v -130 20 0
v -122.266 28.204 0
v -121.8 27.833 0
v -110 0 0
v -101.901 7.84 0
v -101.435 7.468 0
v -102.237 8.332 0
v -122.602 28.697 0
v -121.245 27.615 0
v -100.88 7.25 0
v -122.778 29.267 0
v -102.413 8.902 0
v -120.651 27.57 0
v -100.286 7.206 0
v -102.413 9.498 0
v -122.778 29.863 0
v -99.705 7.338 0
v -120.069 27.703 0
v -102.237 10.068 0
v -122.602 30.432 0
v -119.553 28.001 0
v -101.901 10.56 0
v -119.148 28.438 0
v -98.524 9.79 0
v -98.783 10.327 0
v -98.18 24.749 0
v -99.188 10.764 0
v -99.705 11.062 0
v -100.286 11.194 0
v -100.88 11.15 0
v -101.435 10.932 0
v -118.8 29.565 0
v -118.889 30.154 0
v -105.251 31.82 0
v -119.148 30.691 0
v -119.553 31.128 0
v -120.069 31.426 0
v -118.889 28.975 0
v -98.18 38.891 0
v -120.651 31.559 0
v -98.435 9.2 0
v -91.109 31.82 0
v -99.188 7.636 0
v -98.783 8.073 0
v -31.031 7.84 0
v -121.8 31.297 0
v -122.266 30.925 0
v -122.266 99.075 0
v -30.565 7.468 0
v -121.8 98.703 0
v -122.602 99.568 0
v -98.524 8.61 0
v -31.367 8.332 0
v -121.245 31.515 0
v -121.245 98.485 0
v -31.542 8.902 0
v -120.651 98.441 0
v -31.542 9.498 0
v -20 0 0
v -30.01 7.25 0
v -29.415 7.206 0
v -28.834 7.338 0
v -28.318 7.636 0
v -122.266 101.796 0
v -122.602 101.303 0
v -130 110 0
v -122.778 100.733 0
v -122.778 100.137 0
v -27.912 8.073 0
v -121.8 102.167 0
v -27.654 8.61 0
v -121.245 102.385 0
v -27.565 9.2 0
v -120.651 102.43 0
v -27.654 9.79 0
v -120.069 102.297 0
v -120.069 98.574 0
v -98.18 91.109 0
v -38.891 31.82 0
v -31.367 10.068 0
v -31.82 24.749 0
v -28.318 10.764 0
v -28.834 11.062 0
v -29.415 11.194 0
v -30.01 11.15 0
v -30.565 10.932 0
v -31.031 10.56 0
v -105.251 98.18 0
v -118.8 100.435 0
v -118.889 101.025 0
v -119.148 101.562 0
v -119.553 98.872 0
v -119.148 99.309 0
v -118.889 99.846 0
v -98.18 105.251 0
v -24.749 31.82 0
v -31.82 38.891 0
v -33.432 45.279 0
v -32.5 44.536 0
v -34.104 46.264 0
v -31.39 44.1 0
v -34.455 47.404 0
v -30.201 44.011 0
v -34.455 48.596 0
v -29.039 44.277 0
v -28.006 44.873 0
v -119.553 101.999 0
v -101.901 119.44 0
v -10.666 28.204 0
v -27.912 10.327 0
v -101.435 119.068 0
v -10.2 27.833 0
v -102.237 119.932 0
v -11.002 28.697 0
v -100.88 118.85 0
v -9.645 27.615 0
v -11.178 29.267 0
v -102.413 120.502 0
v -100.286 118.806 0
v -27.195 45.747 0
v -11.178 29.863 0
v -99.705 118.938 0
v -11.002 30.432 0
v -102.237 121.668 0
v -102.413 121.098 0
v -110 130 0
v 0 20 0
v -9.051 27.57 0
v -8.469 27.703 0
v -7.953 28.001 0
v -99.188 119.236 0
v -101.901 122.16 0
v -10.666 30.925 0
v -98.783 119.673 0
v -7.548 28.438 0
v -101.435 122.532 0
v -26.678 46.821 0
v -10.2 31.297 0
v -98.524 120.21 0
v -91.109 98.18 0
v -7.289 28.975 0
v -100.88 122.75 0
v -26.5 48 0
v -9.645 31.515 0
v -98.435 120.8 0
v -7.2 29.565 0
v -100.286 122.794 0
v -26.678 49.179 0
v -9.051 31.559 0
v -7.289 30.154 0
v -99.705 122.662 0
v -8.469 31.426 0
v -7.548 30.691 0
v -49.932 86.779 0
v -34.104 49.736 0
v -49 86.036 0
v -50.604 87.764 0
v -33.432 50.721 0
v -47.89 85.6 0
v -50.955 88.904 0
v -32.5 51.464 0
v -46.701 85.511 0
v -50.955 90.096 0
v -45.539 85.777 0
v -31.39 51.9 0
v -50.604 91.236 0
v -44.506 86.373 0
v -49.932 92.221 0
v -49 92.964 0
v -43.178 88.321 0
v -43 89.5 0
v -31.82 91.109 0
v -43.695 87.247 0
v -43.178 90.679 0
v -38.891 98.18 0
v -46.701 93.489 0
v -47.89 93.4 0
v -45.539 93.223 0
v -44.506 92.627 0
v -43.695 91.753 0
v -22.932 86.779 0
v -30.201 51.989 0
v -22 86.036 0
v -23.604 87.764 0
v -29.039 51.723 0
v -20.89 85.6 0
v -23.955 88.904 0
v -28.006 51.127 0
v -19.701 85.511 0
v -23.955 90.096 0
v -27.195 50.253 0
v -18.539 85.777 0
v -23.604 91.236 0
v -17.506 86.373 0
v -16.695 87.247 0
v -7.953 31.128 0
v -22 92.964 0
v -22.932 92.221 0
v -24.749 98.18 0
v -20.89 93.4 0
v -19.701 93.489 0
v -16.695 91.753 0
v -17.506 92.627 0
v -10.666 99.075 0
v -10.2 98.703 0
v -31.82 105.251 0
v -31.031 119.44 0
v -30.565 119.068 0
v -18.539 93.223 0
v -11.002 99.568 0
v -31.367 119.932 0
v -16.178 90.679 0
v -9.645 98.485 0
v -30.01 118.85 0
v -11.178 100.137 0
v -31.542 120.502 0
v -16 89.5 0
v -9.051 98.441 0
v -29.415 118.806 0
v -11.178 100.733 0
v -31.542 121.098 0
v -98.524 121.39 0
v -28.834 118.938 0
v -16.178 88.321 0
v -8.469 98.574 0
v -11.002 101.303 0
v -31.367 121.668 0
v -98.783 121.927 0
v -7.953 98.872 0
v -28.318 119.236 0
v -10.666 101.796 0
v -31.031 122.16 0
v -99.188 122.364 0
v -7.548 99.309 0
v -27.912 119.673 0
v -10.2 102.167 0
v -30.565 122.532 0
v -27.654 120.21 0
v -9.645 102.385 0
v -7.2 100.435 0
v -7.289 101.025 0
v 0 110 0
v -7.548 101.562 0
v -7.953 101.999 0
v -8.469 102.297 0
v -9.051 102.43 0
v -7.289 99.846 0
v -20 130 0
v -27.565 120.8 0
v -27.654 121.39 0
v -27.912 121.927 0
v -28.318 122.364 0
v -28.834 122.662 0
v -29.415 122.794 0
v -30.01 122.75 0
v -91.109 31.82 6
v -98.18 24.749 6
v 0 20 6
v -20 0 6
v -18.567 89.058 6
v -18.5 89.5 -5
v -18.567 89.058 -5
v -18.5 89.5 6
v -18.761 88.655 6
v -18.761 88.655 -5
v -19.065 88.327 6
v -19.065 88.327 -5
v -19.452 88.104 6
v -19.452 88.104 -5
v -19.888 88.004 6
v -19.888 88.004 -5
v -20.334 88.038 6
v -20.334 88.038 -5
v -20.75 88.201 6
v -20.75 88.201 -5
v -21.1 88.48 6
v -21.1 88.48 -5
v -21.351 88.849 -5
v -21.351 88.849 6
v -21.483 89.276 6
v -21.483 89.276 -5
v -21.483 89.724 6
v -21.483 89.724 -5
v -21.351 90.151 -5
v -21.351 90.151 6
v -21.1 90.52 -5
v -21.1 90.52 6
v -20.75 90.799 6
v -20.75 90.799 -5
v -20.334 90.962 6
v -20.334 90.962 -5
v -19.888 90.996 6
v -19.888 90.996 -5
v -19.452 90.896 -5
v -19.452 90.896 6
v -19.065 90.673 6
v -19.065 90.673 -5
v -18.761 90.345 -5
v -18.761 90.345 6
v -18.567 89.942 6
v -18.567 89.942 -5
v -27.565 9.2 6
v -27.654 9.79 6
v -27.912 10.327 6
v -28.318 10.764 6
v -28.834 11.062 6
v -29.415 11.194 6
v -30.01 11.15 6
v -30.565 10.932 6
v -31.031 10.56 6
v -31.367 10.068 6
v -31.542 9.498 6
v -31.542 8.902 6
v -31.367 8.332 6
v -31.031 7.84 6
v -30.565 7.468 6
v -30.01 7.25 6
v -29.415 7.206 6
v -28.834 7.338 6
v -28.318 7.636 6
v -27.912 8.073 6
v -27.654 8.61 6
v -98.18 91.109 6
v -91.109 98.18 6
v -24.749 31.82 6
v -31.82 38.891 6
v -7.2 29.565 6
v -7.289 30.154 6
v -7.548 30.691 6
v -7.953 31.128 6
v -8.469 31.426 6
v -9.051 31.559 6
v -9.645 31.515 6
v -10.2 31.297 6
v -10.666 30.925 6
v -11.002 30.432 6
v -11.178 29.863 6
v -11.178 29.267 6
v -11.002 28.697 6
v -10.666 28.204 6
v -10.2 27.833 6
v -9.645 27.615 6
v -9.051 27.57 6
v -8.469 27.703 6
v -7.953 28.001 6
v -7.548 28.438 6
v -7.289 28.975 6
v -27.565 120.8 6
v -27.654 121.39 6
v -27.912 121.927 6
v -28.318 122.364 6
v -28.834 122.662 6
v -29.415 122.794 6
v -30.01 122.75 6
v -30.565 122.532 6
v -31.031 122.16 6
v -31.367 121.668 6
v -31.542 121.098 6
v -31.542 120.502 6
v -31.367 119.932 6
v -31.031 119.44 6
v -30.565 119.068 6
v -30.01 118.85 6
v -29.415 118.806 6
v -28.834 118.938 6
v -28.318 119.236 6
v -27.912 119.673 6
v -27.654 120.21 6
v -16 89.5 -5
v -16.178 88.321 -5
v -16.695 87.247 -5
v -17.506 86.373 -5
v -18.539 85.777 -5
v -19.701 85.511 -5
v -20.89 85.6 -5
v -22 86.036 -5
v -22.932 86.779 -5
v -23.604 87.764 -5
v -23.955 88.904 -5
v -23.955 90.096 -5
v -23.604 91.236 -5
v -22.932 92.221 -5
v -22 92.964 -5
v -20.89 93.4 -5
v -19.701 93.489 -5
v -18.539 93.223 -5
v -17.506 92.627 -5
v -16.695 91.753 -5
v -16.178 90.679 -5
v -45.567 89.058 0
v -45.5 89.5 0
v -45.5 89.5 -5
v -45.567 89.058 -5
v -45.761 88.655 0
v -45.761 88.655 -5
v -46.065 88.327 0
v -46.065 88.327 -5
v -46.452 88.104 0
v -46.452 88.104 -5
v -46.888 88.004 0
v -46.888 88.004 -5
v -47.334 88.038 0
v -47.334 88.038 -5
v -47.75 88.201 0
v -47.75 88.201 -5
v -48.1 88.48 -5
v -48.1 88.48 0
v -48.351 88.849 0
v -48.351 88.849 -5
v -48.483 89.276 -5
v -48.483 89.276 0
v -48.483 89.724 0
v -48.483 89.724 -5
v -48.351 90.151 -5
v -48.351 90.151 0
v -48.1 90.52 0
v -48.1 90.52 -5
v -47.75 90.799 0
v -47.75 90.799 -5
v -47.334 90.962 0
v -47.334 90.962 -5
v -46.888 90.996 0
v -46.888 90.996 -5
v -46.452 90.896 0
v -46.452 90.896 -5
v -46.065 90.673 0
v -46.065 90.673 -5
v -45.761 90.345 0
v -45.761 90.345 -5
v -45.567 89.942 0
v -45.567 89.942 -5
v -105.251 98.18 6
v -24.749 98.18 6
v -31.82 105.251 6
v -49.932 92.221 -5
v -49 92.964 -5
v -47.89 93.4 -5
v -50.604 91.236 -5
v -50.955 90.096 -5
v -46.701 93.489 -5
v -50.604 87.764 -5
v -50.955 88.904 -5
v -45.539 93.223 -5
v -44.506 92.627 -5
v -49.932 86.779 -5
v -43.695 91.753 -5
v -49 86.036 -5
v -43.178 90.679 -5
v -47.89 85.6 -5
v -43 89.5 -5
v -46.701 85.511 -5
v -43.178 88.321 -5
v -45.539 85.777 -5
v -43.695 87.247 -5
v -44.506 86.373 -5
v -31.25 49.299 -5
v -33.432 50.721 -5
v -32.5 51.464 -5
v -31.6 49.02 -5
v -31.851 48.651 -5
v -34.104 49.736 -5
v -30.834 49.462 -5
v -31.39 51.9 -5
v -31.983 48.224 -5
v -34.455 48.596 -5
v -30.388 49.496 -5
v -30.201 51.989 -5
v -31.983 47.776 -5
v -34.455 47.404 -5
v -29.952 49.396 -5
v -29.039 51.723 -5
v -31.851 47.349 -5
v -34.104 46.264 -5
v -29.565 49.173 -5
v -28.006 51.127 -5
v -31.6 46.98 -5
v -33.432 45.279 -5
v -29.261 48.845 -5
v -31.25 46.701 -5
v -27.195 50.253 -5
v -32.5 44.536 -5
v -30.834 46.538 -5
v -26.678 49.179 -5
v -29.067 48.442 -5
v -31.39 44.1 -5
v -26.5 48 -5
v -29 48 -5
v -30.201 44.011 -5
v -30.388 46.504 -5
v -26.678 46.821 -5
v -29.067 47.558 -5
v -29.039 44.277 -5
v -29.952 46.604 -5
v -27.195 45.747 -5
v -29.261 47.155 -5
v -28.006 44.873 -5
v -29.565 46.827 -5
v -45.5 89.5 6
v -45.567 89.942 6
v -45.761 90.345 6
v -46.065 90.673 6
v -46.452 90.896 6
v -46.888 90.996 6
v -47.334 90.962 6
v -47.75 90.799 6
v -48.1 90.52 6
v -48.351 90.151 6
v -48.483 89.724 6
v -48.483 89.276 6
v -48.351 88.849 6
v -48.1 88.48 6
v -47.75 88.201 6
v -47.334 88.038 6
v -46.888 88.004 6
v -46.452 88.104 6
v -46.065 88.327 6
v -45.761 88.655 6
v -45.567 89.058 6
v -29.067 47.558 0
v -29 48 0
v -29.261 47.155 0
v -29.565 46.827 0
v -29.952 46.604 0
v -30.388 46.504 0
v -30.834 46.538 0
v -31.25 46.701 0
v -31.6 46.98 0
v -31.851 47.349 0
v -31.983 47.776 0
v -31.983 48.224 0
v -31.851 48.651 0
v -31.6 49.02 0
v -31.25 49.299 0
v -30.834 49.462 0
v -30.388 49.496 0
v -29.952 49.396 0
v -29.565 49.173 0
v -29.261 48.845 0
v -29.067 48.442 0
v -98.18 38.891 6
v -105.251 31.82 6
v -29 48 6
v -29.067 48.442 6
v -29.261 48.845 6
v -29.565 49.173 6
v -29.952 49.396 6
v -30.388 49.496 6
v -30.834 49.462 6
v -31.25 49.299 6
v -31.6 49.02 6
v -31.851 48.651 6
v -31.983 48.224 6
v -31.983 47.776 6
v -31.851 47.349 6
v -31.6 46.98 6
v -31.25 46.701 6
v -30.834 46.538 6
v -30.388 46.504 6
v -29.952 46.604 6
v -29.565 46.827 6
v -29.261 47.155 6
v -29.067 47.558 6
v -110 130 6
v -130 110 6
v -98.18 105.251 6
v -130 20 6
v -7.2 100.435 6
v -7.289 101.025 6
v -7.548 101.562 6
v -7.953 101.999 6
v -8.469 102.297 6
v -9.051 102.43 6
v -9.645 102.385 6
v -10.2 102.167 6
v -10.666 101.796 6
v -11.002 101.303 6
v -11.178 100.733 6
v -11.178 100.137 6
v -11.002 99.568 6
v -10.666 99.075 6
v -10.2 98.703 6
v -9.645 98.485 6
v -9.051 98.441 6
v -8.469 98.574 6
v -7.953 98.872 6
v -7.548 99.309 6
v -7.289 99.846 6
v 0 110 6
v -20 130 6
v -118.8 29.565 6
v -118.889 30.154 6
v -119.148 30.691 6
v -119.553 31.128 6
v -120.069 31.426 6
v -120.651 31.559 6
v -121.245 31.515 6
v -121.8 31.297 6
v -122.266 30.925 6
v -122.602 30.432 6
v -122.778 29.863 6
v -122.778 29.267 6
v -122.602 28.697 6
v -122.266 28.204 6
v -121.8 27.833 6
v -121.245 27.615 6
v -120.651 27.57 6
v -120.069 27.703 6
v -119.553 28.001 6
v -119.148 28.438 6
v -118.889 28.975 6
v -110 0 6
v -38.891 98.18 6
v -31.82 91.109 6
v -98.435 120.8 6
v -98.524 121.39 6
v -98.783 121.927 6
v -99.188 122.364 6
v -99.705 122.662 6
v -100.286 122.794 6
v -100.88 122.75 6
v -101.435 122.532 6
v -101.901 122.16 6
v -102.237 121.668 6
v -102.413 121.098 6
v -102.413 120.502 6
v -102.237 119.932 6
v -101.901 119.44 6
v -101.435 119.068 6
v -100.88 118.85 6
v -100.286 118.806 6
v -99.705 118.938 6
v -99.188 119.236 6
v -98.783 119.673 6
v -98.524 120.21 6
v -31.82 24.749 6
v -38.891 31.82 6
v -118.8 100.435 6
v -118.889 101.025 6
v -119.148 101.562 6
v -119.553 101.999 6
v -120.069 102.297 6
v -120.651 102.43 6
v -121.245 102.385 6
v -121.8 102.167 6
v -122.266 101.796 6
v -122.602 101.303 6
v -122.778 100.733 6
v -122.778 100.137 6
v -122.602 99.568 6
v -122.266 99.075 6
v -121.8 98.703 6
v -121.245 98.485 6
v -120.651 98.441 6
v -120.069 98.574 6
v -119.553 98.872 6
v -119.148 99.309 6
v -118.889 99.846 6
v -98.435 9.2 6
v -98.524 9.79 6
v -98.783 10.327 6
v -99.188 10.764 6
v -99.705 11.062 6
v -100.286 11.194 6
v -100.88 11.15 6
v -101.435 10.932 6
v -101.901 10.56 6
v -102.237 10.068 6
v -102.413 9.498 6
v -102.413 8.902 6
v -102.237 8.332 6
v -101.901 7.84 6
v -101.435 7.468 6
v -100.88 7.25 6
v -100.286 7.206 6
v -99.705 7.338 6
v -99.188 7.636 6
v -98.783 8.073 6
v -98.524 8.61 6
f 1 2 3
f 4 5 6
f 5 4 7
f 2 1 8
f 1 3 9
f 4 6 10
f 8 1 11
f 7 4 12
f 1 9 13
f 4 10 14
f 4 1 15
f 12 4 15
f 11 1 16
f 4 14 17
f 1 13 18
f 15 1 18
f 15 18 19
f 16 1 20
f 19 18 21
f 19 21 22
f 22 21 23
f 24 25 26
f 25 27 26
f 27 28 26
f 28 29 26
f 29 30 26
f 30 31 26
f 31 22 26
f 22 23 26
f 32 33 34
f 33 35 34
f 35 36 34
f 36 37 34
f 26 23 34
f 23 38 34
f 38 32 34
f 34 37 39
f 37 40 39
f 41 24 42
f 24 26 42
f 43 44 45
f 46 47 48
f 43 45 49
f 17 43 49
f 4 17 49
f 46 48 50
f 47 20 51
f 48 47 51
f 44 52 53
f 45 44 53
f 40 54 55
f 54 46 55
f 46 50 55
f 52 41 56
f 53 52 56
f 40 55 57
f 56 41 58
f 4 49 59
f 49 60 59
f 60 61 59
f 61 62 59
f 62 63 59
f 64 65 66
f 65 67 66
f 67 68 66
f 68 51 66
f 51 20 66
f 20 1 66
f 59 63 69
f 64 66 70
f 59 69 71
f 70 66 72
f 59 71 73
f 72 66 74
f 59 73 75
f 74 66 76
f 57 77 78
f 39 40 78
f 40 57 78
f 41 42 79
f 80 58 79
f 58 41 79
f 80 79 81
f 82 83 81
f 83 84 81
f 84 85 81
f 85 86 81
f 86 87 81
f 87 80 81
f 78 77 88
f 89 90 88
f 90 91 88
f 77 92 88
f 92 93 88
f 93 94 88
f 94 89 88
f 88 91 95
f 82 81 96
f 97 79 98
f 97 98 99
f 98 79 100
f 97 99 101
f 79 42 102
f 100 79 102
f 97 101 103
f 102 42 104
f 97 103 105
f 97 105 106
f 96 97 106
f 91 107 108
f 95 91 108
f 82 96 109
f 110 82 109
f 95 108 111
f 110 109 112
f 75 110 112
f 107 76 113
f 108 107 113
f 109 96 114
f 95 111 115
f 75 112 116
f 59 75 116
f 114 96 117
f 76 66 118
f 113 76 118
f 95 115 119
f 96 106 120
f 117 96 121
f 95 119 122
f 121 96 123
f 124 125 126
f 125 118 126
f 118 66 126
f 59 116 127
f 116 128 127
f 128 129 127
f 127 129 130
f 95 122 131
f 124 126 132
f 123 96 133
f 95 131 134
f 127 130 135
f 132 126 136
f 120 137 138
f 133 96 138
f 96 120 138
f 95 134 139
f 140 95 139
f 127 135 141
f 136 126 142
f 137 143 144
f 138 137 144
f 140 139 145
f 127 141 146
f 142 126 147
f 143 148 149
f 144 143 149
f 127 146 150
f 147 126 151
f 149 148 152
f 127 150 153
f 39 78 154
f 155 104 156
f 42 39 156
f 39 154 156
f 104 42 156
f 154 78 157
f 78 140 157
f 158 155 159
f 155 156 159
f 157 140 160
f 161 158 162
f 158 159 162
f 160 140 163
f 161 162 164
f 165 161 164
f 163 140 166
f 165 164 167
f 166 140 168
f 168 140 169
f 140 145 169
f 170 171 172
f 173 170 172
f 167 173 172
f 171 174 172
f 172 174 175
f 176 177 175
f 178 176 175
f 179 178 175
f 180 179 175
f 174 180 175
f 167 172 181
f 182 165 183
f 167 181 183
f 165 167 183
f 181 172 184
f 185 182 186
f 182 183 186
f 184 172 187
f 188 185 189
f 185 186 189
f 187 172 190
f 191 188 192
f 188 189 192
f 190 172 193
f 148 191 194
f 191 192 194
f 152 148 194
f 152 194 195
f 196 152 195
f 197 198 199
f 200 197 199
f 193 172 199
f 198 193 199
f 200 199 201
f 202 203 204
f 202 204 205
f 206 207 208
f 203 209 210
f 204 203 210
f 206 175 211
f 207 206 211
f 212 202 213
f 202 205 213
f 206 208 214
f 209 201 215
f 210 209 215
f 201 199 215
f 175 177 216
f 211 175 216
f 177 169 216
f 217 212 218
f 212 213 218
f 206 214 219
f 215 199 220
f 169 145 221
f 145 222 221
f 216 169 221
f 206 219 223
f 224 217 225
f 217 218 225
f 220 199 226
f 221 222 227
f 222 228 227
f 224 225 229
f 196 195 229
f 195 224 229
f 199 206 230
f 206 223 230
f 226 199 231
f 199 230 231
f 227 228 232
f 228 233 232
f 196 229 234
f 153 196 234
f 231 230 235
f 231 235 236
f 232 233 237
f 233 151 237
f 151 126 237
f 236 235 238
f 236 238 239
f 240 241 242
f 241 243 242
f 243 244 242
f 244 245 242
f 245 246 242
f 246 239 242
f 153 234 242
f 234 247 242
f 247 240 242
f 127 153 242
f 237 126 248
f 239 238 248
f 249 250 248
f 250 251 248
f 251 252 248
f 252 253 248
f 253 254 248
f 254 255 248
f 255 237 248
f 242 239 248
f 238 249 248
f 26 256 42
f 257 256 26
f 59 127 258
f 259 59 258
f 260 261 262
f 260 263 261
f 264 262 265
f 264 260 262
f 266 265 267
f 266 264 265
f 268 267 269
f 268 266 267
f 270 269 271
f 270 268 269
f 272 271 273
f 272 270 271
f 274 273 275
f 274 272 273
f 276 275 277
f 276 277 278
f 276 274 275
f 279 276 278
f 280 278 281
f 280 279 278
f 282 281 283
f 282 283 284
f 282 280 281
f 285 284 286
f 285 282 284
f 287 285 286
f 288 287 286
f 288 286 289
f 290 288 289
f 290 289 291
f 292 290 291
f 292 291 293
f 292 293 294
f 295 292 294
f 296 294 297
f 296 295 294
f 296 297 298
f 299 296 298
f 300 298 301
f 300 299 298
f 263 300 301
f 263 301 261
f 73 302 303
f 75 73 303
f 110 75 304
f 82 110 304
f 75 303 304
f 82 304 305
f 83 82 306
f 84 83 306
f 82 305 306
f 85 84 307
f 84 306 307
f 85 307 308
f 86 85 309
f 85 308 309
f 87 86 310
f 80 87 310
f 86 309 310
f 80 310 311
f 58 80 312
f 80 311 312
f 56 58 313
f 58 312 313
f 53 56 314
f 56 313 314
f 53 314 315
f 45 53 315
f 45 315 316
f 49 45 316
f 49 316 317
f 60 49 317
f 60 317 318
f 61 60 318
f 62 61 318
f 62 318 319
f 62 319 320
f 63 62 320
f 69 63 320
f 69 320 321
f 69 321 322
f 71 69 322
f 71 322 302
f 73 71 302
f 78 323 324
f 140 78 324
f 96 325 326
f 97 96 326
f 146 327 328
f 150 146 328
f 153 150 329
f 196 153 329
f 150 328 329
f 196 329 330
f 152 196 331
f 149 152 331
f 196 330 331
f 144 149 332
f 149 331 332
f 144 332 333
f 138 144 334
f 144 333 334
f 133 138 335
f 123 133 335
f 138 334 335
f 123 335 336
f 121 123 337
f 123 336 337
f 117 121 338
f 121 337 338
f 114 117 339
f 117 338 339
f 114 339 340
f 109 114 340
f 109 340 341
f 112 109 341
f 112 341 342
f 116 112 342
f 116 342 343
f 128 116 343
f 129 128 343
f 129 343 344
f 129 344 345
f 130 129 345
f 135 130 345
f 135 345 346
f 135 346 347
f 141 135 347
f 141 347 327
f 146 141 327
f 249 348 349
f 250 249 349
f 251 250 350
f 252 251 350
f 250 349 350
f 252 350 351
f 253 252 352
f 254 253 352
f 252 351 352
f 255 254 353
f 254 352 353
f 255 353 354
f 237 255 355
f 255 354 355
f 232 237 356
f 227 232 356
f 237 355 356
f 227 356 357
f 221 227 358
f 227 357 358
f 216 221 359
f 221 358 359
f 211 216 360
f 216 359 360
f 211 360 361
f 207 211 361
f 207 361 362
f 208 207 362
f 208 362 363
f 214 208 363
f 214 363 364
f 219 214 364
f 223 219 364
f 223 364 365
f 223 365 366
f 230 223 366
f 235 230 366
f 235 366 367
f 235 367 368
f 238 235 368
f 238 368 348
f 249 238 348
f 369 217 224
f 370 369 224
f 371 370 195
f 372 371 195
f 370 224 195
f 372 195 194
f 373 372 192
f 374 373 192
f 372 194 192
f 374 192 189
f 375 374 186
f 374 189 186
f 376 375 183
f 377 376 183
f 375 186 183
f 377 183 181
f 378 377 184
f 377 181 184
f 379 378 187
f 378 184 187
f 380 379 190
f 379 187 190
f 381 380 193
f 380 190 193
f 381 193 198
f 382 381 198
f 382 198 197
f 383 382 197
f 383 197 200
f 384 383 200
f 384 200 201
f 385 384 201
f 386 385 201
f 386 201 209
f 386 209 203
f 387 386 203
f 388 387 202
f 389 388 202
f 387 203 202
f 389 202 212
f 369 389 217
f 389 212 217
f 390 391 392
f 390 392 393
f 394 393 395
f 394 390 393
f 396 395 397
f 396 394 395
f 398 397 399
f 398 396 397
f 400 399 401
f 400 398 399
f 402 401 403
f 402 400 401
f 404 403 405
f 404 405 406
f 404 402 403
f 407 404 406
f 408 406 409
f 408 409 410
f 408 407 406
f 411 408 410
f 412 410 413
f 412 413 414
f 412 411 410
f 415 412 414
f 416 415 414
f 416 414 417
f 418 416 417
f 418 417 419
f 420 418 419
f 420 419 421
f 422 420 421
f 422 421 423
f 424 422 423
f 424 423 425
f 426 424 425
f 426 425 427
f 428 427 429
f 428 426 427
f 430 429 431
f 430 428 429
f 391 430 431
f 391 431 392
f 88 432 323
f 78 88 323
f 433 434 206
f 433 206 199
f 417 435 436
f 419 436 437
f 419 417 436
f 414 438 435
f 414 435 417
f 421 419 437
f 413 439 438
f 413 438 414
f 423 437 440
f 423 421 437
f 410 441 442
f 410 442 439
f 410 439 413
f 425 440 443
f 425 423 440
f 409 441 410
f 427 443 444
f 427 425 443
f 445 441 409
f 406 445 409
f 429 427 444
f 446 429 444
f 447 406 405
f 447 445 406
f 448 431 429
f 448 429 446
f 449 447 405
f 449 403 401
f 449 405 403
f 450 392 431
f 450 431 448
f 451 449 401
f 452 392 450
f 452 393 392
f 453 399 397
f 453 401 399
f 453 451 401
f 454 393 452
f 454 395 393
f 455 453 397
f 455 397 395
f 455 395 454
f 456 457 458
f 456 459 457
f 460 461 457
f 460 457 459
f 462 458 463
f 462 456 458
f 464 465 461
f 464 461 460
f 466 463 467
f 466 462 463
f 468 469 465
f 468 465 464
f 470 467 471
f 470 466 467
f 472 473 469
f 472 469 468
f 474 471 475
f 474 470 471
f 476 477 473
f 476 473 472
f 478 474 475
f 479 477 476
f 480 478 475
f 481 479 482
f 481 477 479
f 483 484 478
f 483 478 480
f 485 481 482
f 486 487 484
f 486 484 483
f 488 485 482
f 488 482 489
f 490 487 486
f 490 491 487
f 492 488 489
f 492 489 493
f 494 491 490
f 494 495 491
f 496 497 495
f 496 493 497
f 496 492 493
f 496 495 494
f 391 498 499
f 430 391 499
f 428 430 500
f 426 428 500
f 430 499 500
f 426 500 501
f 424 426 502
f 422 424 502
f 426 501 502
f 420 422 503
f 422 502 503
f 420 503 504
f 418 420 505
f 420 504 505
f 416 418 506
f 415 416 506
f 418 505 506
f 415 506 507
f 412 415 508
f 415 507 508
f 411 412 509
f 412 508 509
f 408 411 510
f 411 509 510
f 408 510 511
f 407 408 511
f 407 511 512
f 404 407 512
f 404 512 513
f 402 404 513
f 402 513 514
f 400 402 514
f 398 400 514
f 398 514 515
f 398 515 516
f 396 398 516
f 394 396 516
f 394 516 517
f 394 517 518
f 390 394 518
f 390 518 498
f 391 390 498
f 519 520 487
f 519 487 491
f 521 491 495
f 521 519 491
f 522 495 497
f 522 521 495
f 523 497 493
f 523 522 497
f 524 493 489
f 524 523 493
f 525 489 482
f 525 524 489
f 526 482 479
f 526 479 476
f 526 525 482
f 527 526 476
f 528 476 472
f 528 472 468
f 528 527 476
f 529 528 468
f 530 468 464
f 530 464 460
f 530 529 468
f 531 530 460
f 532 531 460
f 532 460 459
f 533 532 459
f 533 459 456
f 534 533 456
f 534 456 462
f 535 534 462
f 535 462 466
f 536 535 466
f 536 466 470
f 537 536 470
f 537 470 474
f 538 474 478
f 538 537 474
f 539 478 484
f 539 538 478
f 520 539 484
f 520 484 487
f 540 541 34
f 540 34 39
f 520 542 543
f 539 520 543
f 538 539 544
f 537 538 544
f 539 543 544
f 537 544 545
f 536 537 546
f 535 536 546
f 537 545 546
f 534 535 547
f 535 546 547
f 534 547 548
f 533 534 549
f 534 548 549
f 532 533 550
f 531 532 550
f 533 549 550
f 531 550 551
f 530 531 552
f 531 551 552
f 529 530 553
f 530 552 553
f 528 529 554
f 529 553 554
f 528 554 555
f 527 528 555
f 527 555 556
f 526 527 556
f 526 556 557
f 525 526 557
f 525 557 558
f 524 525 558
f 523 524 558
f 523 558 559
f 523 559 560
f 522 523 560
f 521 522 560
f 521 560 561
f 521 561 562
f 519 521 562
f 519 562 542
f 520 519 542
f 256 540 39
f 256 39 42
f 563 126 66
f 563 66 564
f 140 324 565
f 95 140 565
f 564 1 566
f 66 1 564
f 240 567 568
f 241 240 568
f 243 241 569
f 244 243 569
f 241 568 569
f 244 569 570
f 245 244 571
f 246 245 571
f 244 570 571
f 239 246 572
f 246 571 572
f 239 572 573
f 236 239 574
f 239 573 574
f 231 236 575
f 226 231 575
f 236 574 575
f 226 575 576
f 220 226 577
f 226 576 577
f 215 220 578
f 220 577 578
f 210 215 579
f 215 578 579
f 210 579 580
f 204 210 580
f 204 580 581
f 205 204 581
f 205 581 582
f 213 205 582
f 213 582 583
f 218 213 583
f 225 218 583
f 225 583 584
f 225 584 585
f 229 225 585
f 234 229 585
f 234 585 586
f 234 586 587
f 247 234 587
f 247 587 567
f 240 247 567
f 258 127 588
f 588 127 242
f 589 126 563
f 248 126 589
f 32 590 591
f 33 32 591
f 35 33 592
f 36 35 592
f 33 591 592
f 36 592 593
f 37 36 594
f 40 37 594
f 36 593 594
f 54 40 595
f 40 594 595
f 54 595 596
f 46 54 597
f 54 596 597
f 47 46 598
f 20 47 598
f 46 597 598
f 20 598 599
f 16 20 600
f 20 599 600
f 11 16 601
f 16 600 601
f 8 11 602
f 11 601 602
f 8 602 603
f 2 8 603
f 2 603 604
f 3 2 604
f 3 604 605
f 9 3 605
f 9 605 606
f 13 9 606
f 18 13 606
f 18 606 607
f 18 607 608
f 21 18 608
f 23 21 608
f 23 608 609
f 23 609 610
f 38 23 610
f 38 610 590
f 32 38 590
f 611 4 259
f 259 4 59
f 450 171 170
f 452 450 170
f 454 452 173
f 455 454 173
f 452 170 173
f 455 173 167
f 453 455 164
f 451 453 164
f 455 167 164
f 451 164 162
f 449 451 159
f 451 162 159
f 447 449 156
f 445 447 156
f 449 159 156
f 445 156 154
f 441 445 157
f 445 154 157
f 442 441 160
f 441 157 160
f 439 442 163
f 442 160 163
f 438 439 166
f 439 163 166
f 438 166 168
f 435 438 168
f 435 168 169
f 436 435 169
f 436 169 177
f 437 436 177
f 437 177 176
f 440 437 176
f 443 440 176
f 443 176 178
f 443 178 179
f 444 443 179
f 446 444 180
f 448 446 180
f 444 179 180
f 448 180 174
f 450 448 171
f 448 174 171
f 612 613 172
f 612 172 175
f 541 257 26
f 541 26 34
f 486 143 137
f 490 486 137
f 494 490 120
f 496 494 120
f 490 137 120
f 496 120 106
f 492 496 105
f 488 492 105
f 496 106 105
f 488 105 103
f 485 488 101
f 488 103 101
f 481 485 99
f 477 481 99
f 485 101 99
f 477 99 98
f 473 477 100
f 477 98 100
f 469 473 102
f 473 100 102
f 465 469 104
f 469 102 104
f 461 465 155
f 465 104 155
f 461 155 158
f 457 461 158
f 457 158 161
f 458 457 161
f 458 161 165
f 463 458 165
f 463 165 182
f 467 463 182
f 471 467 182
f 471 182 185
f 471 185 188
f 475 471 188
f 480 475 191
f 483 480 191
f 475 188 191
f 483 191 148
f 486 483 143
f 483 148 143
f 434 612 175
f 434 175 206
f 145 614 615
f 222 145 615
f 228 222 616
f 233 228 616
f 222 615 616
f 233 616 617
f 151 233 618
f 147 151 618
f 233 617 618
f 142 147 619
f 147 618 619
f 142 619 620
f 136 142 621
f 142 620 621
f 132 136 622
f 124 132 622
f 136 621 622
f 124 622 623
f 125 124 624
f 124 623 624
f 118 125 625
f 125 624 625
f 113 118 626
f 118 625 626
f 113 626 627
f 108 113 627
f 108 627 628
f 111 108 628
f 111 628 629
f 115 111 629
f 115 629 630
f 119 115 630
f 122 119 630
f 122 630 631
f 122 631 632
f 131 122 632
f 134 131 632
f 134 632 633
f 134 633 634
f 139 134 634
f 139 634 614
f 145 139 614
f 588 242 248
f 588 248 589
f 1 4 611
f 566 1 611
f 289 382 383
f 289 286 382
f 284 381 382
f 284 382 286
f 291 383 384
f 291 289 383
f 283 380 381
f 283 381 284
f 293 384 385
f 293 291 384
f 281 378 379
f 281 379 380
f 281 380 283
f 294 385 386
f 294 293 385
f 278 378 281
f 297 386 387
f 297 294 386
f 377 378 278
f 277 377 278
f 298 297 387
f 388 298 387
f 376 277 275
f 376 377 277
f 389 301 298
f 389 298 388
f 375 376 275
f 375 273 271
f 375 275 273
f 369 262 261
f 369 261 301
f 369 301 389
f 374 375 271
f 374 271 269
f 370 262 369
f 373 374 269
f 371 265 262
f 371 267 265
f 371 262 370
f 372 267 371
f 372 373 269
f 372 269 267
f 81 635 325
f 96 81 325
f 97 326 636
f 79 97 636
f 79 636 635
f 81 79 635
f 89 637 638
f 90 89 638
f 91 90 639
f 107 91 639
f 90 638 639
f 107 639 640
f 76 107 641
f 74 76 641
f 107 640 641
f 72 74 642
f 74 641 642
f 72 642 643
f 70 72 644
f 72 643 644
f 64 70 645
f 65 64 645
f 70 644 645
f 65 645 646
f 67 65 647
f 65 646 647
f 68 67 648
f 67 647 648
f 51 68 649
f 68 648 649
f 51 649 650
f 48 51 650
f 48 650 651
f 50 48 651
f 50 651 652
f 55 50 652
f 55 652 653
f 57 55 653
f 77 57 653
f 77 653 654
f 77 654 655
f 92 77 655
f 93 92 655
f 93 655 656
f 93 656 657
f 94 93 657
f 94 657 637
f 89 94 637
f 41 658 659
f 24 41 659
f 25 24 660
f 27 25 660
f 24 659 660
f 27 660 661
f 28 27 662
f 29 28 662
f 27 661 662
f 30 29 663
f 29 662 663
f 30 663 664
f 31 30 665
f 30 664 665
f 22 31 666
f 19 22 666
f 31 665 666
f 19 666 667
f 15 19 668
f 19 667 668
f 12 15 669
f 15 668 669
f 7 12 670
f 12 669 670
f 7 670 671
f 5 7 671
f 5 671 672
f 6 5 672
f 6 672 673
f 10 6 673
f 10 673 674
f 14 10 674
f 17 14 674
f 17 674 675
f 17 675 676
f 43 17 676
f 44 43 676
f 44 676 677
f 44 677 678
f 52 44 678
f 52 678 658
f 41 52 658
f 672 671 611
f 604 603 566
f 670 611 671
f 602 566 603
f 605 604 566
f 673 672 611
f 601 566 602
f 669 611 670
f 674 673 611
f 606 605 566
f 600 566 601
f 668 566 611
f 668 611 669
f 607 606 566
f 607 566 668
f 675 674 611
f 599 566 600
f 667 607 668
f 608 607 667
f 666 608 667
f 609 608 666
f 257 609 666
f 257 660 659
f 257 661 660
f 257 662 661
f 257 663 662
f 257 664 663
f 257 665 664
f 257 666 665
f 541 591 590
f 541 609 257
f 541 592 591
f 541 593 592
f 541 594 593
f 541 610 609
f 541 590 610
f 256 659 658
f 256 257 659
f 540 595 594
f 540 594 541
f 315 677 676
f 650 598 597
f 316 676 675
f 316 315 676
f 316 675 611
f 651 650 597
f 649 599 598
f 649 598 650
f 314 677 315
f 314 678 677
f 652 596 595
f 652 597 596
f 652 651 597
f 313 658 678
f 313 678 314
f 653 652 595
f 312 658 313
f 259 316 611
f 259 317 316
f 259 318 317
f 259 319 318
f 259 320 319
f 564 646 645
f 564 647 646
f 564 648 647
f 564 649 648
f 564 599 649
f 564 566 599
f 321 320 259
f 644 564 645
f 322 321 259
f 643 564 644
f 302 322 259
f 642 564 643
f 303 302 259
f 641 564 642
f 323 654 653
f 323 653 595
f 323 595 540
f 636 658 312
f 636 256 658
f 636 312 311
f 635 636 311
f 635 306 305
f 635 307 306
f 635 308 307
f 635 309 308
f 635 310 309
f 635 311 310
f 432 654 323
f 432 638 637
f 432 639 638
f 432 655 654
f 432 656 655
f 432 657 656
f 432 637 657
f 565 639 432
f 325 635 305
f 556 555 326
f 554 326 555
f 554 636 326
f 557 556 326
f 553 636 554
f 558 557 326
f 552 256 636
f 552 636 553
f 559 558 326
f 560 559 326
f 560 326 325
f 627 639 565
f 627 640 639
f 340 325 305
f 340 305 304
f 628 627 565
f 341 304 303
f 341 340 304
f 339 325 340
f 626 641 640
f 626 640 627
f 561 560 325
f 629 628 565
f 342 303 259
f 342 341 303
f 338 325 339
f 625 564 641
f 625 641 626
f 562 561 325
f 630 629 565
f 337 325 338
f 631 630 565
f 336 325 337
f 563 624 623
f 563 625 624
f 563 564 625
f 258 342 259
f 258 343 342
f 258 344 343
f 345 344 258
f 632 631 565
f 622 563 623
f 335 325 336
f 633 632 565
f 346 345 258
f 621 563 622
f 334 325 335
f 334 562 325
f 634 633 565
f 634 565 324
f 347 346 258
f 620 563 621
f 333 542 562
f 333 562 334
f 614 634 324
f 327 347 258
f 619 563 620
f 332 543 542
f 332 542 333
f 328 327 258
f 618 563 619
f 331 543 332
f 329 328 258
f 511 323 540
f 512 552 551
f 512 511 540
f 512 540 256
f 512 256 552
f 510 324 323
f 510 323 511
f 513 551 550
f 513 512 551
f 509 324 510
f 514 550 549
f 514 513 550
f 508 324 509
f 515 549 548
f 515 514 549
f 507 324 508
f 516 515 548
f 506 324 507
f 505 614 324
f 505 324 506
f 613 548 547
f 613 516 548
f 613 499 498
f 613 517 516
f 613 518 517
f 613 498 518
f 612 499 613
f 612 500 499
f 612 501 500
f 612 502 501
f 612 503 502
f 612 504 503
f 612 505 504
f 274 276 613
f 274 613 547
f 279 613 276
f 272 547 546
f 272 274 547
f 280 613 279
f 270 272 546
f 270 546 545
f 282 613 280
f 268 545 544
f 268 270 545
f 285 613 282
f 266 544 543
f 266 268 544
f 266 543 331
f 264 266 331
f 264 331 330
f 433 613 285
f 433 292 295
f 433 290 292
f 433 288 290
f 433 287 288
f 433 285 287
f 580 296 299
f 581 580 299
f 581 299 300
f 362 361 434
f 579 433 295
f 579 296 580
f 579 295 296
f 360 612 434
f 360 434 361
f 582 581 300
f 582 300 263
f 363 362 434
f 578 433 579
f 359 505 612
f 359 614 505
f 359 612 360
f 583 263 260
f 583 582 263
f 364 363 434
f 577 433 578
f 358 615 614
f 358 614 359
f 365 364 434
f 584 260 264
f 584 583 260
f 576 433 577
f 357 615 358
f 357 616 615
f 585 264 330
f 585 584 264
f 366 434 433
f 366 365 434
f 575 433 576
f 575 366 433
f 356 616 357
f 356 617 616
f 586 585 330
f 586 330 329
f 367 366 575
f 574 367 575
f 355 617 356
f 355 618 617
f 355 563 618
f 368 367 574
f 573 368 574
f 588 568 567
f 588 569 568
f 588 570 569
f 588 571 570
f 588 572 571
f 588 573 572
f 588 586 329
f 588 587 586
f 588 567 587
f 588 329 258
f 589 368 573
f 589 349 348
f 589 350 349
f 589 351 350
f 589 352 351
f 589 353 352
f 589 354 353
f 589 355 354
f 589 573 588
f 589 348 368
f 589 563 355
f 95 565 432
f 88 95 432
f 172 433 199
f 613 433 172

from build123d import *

# Parameters (mm, degrees)
SKETCH_1_W          = 130
SKETCH_1_H          = 130
EXTRUDE_1_DEPTH     = 6
CUT_EXTRUDE_1_DEPTH = 6
CUT_EXTRUDE_2_REACH = 185.946
SKETCH_11_R         = 2
CHAMFER_1_SIZE      = 20
CUT_EXTRUDE_3_REACH = 185.946
SKETCH_12_R         = 1.5
SKETCH_13_R         = 4
SKETCH_13_R_2       = 1.5
EXTRUDE_2_DEPTH     = 5


with BuildPart() as part:
    # 草圖1 → 填料-伸長1 (new body)
    with BuildSketch(Plane.XY):
        with Locations((-65, 65)):
            Rectangle(SKETCH_1_W, SKETCH_1_H)
    extrude(amount=EXTRUDE_1_DEPTH)

    # 草圖10 → 除料-伸長1 (cut)
    with BuildSketch(Plane.XY.offset(6)):
        Polygon((-38.890872965, 98.180194847), (-31.819805153, 105.251262658), (-24.748737342, 98.180194847), (-31.819805153, 91.109127035), align=None)
        Polygon((-98.180194847, 105.251262658), (-105.251262658, 98.180194847), (-98.180194847, 91.109127035), (-91.109127035, 98.180194847), align=None)
        Polygon((-91.109127035, 31.819805153), (-98.180194847, 24.748737342), (-105.251262658, 31.819805153), (-98.180194847, 38.890872965), align=None)
        Polygon((-31.819805153, 24.748737342), (-24.748737342, 31.819805153), (-31.819805153, 38.890872965), (-38.890872965, 31.819805153), align=None)
    extrude(amount=-CUT_EXTRUDE_1_DEPTH, mode=Mode.SUBTRACT)

    # 草圖11 → 除料-伸長2 (cut, up to next)
    with BuildSketch(Plane.XY.offset(6), mode=Mode.PRIVATE) as cut_extrude_2_sk1:
        with Locations((-9.2, 100.435324702)):
            Circle(SKETCH_11_R)
    cut_extrude_2_tool1 = extrude(cut_extrude_2_sk1.sketch, amount=-CUT_EXTRUDE_2_REACH, mode=Mode.PRIVATE) & part.part
    # 草圖11 → 除料-伸長2 (cut, up to next)
    with BuildSketch(Plane.XY.offset(6), mode=Mode.PRIVATE) as cut_extrude_2_sk2:
        with Locations((-29.564675298, 120.8)):
            Circle(SKETCH_11_R)
    cut_extrude_2_tool2 = extrude(cut_extrude_2_sk2.sketch, amount=-CUT_EXTRUDE_2_REACH, mode=Mode.PRIVATE) & part.part
    # 草圖11 → 除料-伸長2 (cut, up to next)
    with BuildSketch(Plane.XY.offset(6), mode=Mode.PRIVATE) as cut_extrude_2_sk3:
        with Locations((-100.435324702, 120.8)):
            Circle(SKETCH_11_R)
    cut_extrude_2_tool3 = extrude(cut_extrude_2_sk3.sketch, amount=-CUT_EXTRUDE_2_REACH, mode=Mode.PRIVATE) & part.part
    # 草圖11 → 除料-伸長2 (cut, up to next)
    with BuildSketch(Plane.XY.offset(6), mode=Mode.PRIVATE) as cut_extrude_2_sk4:
        with Locations((-120.8, 100.435324702)):
            Circle(SKETCH_11_R)
    cut_extrude_2_tool4 = extrude(cut_extrude_2_sk4.sketch, amount=-CUT_EXTRUDE_2_REACH, mode=Mode.PRIVATE) & part.part
    # 草圖11 → 除料-伸長2 (cut, up to next)
    with BuildSketch(Plane.XY.offset(6), mode=Mode.PRIVATE) as cut_extrude_2_sk5:
        with Locations((-120.8, 29.564675298)):
            Circle(SKETCH_11_R)
    cut_extrude_2_tool5 = extrude(cut_extrude_2_sk5.sketch, amount=-CUT_EXTRUDE_2_REACH, mode=Mode.PRIVATE) & part.part
    # 草圖11 → 除料-伸長2 (cut, up to next)
    with BuildSketch(Plane.XY.offset(6), mode=Mode.PRIVATE) as cut_extrude_2_sk6:
        with Locations((-100.435324702, 9.2)):
            Circle(SKETCH_11_R)
    cut_extrude_2_tool6 = extrude(cut_extrude_2_sk6.sketch, amount=-CUT_EXTRUDE_2_REACH, mode=Mode.PRIVATE) & part.part
    # 草圖11 → 除料-伸長2 (cut, up to next)
    with BuildSketch(Plane.XY.offset(6), mode=Mode.PRIVATE) as cut_extrude_2_sk7:
        with Locations((-29.564675298, 9.2)):
            Circle(SKETCH_11_R)
    cut_extrude_2_tool7 = extrude(cut_extrude_2_sk7.sketch, amount=-CUT_EXTRUDE_2_REACH, mode=Mode.PRIVATE) & part.part
    # 草圖11 → 除料-伸長2 (cut, up to next)
    with BuildSketch(Plane.XY.offset(6), mode=Mode.PRIVATE) as cut_extrude_2_sk8:
        with Locations((-9.2, 29.564675298)):
            Circle(SKETCH_11_R)
    cut_extrude_2_tool8 = extrude(cut_extrude_2_sk8.sketch, amount=-CUT_EXTRUDE_2_REACH, mode=Mode.PRIVATE) & part.part
    add(cut_extrude_2_tool1.solids().sort_by_distance((-9.2, 100.435325, 6))[0], mode=Mode.SUBTRACT)
    add(cut_extrude_2_tool2.solids().sort_by_distance((-29.564675, 120.8, 6))[0], mode=Mode.SUBTRACT)
    add(cut_extrude_2_tool3.solids().sort_by_distance((-100.435325, 120.8, 6))[0], mode=Mode.SUBTRACT)
    add(cut_extrude_2_tool4.solids().sort_by_distance((-120.8, 100.435325, 6))[0], mode=Mode.SUBTRACT)
    add(cut_extrude_2_tool5.solids().sort_by_distance((-120.8, 29.564675, 6))[0], mode=Mode.SUBTRACT)
    add(cut_extrude_2_tool6.solids().sort_by_distance((-100.435325, 9.2, 6))[0], mode=Mode.SUBTRACT)
    add(cut_extrude_2_tool7.solids().sort_by_distance((-29.564675, 9.2, 6))[0], mode=Mode.SUBTRACT)
    add(cut_extrude_2_tool8.solids().sort_by_distance((-9.2, 29.564675, 6))[0], mode=Mode.SUBTRACT)

    # 導角1
    chamfer_1_edges = [part.edges().sort_by_distance(p)[0] for p in [
        (-130, 0, 3),
        (-130, 130, 3),
        (0, 130, 3),
        (0, 0, 3),
    ]]
    chamfer(chamfer_1_edges, length=CHAMFER_1_SIZE)

    # 草圖12 → 除料-伸長3 (cut, up to next)
    with BuildSketch(Plane.XY.offset(6), mode=Mode.PRIVATE) as cut_extrude_3_sk1:
        with Locations((-47, 89.5)):
            Circle(SKETCH_12_R)
    cut_extrude_3_tool1 = extrude(cut_extrude_3_sk1.sketch, amount=-CUT_EXTRUDE_3_REACH, mode=Mode.PRIVATE) & part.part
    # 草圖12 → 除料-伸長3 (cut, up to next)
    with BuildSketch(Plane.XY.offset(6), mode=Mode.PRIVATE) as cut_extrude_3_sk2:
        with Locations((-20, 89.5)):
            Circle(SKETCH_12_R)
    cut_extrude_3_tool2 = extrude(cut_extrude_3_sk2.sketch, amount=-CUT_EXTRUDE_3_REACH, mode=Mode.PRIVATE) & part.part
    # 草圖12 → 除料-伸長3 (cut, up to next)
    with BuildSketch(Plane.XY.offset(6), mode=Mode.PRIVATE) as cut_extrude_3_sk3:
        with Locations((-30.5, 48)):
            Circle(SKETCH_12_R)
    cut_extrude_3_tool3 = extrude(cut_extrude_3_sk3.sketch, amount=-CUT_EXTRUDE_3_REACH, mode=Mode.PRIVATE) & part.part
    add(cut_extrude_3_tool1.solids().sort_by_distance((-47, 89.5, 6))[0], mode=Mode.SUBTRACT)
    add(cut_extrude_3_tool2.solids().sort_by_distance((-20, 89.5, 6))[0], mode=Mode.SUBTRACT)
    add(cut_extrude_3_tool3.solids().sort_by_distance((-30.5, 48, 6))[0], mode=Mode.SUBTRACT)

    # 草圖13 → 填料-伸長2 (add)
    # profile 1 of 3: a face of its own
    with BuildSketch(Plane(origin=(0, 0, 0), x_dir=(-1, 0, 0), z_dir=(0, 0, -1))):
        with Locations(Location((20, 89.5, 0), (0, 0, 180))):
            Circle(SKETCH_13_R)
        with Locations(Location((20, 89.5, 0), (0, 0, 180))):
            Circle(SKETCH_13_R_2, mode=Mode.SUBTRACT)
    # profile 2 of 3: a face of its own
    with BuildSketch(Plane(origin=(0, 0, 0), x_dir=(-1, 0, 0), z_dir=(0, 0, -1))):
        with Locations(Location((47, 89.5, 0), (0, 0, 180))):
            Circle(SKETCH_13_R)
        with Locations(Location((47, 89.5, 0), (0, 0, 180))):
            Circle(SKETCH_13_R_2, mode=Mode.SUBTRACT)
    # profile 3 of 3: a face of its own
    with BuildSketch(Plane(origin=(0, 0, 0), x_dir=(-1, 0, 0), z_dir=(0, 0, -1))):
        with Locations(Location((30.5, 48, 0), (0, 0, 180))):
            Circle(SKETCH_13_R)
        with Locations(Location((30.5, 48, 0), (0, 0, 180))):
            Circle(SKETCH_13_R_2, mode=Mode.SUBTRACT)
    extrude(amount=EXTRUDE_2_DEPTH)


solid = part.part
